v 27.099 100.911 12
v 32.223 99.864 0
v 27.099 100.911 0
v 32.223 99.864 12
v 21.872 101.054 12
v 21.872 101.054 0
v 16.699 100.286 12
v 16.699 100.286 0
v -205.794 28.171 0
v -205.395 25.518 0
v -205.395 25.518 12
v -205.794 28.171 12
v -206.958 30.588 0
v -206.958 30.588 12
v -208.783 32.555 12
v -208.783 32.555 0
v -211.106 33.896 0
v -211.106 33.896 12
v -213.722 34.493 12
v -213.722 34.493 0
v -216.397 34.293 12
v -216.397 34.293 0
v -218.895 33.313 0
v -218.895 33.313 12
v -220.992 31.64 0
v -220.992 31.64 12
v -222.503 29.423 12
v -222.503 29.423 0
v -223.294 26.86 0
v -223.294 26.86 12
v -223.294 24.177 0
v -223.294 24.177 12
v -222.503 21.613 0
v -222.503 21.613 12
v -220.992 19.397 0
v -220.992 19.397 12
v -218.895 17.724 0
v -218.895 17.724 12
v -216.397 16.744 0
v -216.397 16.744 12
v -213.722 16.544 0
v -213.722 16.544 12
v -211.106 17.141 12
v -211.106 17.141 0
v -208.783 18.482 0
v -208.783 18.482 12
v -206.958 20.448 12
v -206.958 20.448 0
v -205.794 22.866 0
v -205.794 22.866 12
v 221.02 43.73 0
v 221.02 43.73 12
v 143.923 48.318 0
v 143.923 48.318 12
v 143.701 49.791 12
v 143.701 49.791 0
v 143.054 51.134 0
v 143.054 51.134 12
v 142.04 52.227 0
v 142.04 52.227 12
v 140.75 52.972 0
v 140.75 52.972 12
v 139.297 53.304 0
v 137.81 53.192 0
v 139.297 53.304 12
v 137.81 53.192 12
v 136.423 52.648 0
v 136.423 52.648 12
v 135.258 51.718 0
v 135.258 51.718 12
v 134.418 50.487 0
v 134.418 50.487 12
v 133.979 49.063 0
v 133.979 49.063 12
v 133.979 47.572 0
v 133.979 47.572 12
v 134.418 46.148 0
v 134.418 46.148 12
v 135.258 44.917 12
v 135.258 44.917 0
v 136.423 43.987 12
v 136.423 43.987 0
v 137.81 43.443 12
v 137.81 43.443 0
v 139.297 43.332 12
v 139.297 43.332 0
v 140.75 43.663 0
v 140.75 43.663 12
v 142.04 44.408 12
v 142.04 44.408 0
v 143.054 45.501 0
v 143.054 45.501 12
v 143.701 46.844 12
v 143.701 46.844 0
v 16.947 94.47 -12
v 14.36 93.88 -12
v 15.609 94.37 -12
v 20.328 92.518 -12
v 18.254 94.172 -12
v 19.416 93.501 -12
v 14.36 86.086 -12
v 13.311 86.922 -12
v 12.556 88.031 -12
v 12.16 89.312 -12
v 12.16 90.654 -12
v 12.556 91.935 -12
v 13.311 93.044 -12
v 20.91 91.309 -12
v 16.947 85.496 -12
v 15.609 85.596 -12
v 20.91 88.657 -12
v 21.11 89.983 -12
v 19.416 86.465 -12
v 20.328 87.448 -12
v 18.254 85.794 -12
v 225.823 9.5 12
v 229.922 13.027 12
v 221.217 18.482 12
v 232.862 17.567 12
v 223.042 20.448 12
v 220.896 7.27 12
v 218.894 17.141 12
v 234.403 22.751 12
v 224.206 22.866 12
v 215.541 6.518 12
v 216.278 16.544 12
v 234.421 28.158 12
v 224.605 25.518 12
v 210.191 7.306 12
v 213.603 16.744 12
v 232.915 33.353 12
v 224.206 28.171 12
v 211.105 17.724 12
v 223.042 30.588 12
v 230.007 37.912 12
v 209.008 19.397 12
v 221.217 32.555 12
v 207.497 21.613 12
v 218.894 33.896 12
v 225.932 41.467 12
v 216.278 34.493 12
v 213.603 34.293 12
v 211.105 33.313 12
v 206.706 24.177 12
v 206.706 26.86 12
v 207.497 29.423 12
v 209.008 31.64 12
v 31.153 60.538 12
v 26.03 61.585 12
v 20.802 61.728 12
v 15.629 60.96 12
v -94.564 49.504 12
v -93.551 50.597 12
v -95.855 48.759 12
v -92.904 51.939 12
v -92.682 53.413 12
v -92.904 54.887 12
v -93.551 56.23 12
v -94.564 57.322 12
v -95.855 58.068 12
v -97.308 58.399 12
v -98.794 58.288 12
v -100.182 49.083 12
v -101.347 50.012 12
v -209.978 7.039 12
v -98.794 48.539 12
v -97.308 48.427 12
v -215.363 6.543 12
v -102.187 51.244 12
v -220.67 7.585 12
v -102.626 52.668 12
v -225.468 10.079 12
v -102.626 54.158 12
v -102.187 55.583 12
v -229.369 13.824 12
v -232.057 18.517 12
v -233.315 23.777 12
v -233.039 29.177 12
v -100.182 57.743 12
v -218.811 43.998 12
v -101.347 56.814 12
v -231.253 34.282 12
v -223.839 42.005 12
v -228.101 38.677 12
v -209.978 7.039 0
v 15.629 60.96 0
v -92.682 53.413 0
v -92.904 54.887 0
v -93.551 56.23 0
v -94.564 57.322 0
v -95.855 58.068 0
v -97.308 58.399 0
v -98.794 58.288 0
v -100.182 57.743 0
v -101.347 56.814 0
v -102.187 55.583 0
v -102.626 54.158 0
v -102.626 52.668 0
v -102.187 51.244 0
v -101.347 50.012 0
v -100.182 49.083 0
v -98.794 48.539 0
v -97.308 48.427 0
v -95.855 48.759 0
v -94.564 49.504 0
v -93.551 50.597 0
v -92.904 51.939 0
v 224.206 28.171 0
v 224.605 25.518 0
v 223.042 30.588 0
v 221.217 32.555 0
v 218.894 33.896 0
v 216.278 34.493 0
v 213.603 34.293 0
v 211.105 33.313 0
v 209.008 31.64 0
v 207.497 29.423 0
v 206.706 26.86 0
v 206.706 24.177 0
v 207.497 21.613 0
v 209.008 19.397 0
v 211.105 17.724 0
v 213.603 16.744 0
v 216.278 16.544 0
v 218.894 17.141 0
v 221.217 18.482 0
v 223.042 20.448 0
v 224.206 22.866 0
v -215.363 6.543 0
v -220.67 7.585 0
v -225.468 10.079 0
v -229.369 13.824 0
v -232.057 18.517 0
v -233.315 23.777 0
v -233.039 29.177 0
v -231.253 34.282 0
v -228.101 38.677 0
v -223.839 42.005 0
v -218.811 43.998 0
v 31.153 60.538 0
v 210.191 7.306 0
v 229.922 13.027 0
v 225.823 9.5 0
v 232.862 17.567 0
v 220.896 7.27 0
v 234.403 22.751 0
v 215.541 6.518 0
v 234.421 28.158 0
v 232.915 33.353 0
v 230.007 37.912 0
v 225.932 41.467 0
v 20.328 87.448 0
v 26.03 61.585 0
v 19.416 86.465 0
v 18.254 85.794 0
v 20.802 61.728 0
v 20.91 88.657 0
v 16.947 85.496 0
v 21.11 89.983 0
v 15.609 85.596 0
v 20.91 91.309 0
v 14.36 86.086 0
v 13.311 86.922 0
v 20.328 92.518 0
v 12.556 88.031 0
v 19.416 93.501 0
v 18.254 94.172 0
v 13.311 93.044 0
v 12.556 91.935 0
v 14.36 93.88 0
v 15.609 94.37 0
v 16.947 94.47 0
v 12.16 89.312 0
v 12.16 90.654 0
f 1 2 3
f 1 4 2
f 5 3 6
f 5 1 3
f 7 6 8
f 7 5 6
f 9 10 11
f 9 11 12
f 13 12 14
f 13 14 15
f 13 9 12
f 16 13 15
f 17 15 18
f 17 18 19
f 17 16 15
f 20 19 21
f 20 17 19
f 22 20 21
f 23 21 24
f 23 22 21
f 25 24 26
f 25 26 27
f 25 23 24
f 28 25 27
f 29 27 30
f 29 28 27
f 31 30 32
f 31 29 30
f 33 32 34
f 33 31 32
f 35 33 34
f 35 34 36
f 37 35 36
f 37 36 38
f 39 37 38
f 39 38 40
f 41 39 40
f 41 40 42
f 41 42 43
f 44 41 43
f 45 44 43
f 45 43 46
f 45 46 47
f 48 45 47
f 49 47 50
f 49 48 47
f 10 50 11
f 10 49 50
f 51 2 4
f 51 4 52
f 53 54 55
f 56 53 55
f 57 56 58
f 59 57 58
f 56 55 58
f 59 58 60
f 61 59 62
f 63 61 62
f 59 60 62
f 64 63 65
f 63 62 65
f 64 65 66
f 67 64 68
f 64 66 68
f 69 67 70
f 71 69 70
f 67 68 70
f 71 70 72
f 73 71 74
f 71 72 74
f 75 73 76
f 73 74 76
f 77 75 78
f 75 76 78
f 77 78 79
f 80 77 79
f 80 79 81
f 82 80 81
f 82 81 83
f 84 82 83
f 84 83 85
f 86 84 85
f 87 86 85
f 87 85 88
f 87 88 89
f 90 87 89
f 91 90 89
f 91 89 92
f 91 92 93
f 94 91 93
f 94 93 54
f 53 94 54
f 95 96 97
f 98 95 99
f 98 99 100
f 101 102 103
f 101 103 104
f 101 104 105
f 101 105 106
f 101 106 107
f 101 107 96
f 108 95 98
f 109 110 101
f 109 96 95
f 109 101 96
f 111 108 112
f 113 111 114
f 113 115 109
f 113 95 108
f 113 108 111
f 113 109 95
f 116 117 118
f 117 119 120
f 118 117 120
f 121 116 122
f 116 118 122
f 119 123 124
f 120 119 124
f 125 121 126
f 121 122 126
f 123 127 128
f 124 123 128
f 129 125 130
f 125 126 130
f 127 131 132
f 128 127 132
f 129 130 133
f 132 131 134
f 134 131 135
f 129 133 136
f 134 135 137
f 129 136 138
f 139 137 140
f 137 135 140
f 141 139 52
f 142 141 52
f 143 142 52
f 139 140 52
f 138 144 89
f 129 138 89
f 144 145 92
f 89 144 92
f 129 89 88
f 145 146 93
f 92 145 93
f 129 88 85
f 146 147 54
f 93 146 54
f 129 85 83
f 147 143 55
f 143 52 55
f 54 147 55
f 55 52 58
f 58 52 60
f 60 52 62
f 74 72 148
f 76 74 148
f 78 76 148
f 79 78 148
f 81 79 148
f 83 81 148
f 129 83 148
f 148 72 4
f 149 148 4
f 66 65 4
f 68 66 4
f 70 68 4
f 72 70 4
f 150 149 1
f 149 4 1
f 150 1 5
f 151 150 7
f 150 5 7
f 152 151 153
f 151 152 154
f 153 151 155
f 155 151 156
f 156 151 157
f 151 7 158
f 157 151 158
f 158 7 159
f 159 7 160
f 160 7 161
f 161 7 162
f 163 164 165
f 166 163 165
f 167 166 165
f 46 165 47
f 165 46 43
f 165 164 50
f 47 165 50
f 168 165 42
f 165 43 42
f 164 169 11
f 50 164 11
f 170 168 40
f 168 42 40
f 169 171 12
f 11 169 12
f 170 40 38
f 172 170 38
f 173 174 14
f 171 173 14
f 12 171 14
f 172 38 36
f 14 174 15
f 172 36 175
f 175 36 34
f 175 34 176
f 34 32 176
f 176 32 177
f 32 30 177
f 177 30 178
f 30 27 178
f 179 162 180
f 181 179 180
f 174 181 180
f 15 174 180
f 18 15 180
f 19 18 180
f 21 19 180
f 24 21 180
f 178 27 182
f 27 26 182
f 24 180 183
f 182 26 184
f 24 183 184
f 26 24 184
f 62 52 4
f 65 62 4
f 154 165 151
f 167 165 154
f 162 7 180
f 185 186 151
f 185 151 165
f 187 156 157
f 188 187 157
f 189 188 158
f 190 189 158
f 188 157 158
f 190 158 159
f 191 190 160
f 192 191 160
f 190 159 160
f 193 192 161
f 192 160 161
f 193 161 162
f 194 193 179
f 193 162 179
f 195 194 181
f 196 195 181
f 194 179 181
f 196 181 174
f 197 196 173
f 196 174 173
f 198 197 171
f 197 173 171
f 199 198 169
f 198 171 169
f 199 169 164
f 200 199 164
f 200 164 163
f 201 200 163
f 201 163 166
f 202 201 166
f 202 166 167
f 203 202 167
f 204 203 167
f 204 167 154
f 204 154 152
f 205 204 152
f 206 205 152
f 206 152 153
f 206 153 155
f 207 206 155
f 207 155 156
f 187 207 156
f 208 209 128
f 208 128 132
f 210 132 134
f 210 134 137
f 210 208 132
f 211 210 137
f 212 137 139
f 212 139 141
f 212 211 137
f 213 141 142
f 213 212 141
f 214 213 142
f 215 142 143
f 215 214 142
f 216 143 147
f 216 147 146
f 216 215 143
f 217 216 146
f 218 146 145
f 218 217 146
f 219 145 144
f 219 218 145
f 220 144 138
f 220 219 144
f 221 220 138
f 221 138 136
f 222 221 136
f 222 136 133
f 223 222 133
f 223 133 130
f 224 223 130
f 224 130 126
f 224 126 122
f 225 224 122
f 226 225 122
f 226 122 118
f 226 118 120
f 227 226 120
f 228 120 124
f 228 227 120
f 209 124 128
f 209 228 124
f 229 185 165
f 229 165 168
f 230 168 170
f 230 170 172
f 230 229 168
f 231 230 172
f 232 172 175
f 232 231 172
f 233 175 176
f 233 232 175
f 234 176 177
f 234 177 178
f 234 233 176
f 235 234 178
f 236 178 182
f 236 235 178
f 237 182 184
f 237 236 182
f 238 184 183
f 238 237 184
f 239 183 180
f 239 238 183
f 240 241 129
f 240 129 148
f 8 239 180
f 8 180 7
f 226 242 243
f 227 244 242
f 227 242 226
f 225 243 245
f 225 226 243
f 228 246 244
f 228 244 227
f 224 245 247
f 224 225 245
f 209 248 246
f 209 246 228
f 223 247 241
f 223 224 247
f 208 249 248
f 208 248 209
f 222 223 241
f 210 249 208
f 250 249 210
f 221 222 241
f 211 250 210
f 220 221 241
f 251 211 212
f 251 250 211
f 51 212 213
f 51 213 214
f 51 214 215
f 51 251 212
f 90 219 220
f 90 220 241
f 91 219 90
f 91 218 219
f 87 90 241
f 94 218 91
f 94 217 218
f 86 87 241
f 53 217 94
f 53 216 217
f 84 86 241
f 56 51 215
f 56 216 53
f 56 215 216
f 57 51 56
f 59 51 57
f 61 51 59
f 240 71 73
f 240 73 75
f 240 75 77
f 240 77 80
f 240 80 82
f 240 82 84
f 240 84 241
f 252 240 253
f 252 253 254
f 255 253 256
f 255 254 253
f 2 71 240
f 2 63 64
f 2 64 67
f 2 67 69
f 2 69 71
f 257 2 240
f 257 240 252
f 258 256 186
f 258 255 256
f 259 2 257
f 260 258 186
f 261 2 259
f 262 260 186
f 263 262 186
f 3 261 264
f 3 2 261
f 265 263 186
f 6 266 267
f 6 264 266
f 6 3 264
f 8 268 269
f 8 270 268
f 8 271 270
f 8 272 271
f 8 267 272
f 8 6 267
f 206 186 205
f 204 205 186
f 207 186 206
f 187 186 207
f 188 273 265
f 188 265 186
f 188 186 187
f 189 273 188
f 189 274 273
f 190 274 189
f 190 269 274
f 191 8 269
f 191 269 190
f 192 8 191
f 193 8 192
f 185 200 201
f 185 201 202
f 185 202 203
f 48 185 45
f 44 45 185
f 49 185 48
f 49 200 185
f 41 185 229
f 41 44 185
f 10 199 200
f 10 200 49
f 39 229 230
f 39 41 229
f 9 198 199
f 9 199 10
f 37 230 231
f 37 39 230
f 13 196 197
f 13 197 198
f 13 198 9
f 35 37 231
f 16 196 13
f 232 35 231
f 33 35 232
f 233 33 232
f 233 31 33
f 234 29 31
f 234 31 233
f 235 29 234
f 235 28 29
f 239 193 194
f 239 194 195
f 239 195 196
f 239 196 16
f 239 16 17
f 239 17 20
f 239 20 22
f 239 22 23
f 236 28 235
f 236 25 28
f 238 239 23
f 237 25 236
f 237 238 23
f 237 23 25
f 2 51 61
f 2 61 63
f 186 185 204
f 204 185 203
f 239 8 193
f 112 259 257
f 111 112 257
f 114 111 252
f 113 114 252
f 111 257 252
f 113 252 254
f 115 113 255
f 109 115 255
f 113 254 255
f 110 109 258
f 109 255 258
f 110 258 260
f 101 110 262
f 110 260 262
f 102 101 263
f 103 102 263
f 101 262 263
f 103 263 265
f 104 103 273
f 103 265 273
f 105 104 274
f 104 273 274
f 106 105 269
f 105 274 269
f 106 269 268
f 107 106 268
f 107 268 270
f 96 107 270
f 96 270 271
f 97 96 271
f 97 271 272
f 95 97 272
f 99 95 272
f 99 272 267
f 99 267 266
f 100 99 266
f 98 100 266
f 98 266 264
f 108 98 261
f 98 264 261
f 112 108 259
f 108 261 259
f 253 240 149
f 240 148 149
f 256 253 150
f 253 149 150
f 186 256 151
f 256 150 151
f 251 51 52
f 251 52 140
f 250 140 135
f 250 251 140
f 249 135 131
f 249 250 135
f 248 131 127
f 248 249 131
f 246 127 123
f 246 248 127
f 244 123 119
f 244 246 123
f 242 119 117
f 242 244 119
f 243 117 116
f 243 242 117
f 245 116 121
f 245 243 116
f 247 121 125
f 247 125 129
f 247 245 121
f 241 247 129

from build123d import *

# Parameters (mm, degrees)
CROQUIS1_R              = 9
SALIENTE_EXTRUIR1_DEPTH = 12
REDONDEO1_R             = 30
CROQUIS2_R              = 5
CORTAR_EXTRUIR1_DEPTH   = 256.746915224
CROQUIS3_R              = 4.5
SALIENTE_EXTRUIR2_DEPTH = 12


with BuildPart() as part:
    # Croquis1 → Saliente-Extruir1 (new body)
    with BuildSketch(Plane.XY):
        with BuildLine():
            Line((24.517509814, 102.154502749), (221.020251881, 43.73046074))
            ThreePointArc((221.020251881, 43.73046074), (233.817531659, 20.103577105), (210.190648025, 7.306297327))
            Line((210.190648025, 7.306297327), (23.447731129, 62.828555729))
            Line((23.447731129, 62.828555729), (-209.97786522, 7.038852656))
            ThreePointArc((-209.97786522, 7.038852656), (-232.874076425, 21.101694207), (-218.811234874, 43.997905411))
            Line((-218.811234874, 43.997905411), (24.517509814, 102.154502749))
        make_face()
        with Locations((-214.394550047, 25.518379034)):
            Circle(CROQUIS1_R, mode=Mode.SUBTRACT)
        with Locations((215.605449953, 25.518379034)):
            Circle(CROQUIS1_R, mode=Mode.SUBTRACT)
    extrude(amount=SALIENTE_EXTRUIR1_DEPTH)

    # Redondeo1
    redondeo1_edges = [part.edges().sort_by_distance(p)[0] for p in [
        (23.447731129, 62.828555729, 6),
        (24.517509814, 102.154502749, 6),
    ]]
    fillet(redondeo1_edges, radius=REDONDEO1_R)

    # Croquis2 → Cortar-Extruir1 (cut, through all)
    with BuildSketch(Plane.XY.offset(12)):
        with Locations((138.923000663, 48.317545048)):
            Circle(CROQUIS2_R)
        with Locations((-97.681751872, 53.41323057)):
            Circle(CROQUIS2_R)
    extrude(amount=-CORTAR_EXTRUIR1_DEPTH, mode=Mode.SUBTRACT)

    # Croquis3 → Saliente-Extruir2 (add)
    with BuildSketch(Plane(origin=(0, 0, 0), x_dir=(-1, 0, 0), z_dir=(0, 0, -1))):
        with Locations(Location((-16.610214781, 89.982977062, 0), (0, 0, 180))):
            Circle(CROQUIS3_R)
    extrude(amount=SALIENTE_EXTRUIR2_DEPTH)


solid = part.part
